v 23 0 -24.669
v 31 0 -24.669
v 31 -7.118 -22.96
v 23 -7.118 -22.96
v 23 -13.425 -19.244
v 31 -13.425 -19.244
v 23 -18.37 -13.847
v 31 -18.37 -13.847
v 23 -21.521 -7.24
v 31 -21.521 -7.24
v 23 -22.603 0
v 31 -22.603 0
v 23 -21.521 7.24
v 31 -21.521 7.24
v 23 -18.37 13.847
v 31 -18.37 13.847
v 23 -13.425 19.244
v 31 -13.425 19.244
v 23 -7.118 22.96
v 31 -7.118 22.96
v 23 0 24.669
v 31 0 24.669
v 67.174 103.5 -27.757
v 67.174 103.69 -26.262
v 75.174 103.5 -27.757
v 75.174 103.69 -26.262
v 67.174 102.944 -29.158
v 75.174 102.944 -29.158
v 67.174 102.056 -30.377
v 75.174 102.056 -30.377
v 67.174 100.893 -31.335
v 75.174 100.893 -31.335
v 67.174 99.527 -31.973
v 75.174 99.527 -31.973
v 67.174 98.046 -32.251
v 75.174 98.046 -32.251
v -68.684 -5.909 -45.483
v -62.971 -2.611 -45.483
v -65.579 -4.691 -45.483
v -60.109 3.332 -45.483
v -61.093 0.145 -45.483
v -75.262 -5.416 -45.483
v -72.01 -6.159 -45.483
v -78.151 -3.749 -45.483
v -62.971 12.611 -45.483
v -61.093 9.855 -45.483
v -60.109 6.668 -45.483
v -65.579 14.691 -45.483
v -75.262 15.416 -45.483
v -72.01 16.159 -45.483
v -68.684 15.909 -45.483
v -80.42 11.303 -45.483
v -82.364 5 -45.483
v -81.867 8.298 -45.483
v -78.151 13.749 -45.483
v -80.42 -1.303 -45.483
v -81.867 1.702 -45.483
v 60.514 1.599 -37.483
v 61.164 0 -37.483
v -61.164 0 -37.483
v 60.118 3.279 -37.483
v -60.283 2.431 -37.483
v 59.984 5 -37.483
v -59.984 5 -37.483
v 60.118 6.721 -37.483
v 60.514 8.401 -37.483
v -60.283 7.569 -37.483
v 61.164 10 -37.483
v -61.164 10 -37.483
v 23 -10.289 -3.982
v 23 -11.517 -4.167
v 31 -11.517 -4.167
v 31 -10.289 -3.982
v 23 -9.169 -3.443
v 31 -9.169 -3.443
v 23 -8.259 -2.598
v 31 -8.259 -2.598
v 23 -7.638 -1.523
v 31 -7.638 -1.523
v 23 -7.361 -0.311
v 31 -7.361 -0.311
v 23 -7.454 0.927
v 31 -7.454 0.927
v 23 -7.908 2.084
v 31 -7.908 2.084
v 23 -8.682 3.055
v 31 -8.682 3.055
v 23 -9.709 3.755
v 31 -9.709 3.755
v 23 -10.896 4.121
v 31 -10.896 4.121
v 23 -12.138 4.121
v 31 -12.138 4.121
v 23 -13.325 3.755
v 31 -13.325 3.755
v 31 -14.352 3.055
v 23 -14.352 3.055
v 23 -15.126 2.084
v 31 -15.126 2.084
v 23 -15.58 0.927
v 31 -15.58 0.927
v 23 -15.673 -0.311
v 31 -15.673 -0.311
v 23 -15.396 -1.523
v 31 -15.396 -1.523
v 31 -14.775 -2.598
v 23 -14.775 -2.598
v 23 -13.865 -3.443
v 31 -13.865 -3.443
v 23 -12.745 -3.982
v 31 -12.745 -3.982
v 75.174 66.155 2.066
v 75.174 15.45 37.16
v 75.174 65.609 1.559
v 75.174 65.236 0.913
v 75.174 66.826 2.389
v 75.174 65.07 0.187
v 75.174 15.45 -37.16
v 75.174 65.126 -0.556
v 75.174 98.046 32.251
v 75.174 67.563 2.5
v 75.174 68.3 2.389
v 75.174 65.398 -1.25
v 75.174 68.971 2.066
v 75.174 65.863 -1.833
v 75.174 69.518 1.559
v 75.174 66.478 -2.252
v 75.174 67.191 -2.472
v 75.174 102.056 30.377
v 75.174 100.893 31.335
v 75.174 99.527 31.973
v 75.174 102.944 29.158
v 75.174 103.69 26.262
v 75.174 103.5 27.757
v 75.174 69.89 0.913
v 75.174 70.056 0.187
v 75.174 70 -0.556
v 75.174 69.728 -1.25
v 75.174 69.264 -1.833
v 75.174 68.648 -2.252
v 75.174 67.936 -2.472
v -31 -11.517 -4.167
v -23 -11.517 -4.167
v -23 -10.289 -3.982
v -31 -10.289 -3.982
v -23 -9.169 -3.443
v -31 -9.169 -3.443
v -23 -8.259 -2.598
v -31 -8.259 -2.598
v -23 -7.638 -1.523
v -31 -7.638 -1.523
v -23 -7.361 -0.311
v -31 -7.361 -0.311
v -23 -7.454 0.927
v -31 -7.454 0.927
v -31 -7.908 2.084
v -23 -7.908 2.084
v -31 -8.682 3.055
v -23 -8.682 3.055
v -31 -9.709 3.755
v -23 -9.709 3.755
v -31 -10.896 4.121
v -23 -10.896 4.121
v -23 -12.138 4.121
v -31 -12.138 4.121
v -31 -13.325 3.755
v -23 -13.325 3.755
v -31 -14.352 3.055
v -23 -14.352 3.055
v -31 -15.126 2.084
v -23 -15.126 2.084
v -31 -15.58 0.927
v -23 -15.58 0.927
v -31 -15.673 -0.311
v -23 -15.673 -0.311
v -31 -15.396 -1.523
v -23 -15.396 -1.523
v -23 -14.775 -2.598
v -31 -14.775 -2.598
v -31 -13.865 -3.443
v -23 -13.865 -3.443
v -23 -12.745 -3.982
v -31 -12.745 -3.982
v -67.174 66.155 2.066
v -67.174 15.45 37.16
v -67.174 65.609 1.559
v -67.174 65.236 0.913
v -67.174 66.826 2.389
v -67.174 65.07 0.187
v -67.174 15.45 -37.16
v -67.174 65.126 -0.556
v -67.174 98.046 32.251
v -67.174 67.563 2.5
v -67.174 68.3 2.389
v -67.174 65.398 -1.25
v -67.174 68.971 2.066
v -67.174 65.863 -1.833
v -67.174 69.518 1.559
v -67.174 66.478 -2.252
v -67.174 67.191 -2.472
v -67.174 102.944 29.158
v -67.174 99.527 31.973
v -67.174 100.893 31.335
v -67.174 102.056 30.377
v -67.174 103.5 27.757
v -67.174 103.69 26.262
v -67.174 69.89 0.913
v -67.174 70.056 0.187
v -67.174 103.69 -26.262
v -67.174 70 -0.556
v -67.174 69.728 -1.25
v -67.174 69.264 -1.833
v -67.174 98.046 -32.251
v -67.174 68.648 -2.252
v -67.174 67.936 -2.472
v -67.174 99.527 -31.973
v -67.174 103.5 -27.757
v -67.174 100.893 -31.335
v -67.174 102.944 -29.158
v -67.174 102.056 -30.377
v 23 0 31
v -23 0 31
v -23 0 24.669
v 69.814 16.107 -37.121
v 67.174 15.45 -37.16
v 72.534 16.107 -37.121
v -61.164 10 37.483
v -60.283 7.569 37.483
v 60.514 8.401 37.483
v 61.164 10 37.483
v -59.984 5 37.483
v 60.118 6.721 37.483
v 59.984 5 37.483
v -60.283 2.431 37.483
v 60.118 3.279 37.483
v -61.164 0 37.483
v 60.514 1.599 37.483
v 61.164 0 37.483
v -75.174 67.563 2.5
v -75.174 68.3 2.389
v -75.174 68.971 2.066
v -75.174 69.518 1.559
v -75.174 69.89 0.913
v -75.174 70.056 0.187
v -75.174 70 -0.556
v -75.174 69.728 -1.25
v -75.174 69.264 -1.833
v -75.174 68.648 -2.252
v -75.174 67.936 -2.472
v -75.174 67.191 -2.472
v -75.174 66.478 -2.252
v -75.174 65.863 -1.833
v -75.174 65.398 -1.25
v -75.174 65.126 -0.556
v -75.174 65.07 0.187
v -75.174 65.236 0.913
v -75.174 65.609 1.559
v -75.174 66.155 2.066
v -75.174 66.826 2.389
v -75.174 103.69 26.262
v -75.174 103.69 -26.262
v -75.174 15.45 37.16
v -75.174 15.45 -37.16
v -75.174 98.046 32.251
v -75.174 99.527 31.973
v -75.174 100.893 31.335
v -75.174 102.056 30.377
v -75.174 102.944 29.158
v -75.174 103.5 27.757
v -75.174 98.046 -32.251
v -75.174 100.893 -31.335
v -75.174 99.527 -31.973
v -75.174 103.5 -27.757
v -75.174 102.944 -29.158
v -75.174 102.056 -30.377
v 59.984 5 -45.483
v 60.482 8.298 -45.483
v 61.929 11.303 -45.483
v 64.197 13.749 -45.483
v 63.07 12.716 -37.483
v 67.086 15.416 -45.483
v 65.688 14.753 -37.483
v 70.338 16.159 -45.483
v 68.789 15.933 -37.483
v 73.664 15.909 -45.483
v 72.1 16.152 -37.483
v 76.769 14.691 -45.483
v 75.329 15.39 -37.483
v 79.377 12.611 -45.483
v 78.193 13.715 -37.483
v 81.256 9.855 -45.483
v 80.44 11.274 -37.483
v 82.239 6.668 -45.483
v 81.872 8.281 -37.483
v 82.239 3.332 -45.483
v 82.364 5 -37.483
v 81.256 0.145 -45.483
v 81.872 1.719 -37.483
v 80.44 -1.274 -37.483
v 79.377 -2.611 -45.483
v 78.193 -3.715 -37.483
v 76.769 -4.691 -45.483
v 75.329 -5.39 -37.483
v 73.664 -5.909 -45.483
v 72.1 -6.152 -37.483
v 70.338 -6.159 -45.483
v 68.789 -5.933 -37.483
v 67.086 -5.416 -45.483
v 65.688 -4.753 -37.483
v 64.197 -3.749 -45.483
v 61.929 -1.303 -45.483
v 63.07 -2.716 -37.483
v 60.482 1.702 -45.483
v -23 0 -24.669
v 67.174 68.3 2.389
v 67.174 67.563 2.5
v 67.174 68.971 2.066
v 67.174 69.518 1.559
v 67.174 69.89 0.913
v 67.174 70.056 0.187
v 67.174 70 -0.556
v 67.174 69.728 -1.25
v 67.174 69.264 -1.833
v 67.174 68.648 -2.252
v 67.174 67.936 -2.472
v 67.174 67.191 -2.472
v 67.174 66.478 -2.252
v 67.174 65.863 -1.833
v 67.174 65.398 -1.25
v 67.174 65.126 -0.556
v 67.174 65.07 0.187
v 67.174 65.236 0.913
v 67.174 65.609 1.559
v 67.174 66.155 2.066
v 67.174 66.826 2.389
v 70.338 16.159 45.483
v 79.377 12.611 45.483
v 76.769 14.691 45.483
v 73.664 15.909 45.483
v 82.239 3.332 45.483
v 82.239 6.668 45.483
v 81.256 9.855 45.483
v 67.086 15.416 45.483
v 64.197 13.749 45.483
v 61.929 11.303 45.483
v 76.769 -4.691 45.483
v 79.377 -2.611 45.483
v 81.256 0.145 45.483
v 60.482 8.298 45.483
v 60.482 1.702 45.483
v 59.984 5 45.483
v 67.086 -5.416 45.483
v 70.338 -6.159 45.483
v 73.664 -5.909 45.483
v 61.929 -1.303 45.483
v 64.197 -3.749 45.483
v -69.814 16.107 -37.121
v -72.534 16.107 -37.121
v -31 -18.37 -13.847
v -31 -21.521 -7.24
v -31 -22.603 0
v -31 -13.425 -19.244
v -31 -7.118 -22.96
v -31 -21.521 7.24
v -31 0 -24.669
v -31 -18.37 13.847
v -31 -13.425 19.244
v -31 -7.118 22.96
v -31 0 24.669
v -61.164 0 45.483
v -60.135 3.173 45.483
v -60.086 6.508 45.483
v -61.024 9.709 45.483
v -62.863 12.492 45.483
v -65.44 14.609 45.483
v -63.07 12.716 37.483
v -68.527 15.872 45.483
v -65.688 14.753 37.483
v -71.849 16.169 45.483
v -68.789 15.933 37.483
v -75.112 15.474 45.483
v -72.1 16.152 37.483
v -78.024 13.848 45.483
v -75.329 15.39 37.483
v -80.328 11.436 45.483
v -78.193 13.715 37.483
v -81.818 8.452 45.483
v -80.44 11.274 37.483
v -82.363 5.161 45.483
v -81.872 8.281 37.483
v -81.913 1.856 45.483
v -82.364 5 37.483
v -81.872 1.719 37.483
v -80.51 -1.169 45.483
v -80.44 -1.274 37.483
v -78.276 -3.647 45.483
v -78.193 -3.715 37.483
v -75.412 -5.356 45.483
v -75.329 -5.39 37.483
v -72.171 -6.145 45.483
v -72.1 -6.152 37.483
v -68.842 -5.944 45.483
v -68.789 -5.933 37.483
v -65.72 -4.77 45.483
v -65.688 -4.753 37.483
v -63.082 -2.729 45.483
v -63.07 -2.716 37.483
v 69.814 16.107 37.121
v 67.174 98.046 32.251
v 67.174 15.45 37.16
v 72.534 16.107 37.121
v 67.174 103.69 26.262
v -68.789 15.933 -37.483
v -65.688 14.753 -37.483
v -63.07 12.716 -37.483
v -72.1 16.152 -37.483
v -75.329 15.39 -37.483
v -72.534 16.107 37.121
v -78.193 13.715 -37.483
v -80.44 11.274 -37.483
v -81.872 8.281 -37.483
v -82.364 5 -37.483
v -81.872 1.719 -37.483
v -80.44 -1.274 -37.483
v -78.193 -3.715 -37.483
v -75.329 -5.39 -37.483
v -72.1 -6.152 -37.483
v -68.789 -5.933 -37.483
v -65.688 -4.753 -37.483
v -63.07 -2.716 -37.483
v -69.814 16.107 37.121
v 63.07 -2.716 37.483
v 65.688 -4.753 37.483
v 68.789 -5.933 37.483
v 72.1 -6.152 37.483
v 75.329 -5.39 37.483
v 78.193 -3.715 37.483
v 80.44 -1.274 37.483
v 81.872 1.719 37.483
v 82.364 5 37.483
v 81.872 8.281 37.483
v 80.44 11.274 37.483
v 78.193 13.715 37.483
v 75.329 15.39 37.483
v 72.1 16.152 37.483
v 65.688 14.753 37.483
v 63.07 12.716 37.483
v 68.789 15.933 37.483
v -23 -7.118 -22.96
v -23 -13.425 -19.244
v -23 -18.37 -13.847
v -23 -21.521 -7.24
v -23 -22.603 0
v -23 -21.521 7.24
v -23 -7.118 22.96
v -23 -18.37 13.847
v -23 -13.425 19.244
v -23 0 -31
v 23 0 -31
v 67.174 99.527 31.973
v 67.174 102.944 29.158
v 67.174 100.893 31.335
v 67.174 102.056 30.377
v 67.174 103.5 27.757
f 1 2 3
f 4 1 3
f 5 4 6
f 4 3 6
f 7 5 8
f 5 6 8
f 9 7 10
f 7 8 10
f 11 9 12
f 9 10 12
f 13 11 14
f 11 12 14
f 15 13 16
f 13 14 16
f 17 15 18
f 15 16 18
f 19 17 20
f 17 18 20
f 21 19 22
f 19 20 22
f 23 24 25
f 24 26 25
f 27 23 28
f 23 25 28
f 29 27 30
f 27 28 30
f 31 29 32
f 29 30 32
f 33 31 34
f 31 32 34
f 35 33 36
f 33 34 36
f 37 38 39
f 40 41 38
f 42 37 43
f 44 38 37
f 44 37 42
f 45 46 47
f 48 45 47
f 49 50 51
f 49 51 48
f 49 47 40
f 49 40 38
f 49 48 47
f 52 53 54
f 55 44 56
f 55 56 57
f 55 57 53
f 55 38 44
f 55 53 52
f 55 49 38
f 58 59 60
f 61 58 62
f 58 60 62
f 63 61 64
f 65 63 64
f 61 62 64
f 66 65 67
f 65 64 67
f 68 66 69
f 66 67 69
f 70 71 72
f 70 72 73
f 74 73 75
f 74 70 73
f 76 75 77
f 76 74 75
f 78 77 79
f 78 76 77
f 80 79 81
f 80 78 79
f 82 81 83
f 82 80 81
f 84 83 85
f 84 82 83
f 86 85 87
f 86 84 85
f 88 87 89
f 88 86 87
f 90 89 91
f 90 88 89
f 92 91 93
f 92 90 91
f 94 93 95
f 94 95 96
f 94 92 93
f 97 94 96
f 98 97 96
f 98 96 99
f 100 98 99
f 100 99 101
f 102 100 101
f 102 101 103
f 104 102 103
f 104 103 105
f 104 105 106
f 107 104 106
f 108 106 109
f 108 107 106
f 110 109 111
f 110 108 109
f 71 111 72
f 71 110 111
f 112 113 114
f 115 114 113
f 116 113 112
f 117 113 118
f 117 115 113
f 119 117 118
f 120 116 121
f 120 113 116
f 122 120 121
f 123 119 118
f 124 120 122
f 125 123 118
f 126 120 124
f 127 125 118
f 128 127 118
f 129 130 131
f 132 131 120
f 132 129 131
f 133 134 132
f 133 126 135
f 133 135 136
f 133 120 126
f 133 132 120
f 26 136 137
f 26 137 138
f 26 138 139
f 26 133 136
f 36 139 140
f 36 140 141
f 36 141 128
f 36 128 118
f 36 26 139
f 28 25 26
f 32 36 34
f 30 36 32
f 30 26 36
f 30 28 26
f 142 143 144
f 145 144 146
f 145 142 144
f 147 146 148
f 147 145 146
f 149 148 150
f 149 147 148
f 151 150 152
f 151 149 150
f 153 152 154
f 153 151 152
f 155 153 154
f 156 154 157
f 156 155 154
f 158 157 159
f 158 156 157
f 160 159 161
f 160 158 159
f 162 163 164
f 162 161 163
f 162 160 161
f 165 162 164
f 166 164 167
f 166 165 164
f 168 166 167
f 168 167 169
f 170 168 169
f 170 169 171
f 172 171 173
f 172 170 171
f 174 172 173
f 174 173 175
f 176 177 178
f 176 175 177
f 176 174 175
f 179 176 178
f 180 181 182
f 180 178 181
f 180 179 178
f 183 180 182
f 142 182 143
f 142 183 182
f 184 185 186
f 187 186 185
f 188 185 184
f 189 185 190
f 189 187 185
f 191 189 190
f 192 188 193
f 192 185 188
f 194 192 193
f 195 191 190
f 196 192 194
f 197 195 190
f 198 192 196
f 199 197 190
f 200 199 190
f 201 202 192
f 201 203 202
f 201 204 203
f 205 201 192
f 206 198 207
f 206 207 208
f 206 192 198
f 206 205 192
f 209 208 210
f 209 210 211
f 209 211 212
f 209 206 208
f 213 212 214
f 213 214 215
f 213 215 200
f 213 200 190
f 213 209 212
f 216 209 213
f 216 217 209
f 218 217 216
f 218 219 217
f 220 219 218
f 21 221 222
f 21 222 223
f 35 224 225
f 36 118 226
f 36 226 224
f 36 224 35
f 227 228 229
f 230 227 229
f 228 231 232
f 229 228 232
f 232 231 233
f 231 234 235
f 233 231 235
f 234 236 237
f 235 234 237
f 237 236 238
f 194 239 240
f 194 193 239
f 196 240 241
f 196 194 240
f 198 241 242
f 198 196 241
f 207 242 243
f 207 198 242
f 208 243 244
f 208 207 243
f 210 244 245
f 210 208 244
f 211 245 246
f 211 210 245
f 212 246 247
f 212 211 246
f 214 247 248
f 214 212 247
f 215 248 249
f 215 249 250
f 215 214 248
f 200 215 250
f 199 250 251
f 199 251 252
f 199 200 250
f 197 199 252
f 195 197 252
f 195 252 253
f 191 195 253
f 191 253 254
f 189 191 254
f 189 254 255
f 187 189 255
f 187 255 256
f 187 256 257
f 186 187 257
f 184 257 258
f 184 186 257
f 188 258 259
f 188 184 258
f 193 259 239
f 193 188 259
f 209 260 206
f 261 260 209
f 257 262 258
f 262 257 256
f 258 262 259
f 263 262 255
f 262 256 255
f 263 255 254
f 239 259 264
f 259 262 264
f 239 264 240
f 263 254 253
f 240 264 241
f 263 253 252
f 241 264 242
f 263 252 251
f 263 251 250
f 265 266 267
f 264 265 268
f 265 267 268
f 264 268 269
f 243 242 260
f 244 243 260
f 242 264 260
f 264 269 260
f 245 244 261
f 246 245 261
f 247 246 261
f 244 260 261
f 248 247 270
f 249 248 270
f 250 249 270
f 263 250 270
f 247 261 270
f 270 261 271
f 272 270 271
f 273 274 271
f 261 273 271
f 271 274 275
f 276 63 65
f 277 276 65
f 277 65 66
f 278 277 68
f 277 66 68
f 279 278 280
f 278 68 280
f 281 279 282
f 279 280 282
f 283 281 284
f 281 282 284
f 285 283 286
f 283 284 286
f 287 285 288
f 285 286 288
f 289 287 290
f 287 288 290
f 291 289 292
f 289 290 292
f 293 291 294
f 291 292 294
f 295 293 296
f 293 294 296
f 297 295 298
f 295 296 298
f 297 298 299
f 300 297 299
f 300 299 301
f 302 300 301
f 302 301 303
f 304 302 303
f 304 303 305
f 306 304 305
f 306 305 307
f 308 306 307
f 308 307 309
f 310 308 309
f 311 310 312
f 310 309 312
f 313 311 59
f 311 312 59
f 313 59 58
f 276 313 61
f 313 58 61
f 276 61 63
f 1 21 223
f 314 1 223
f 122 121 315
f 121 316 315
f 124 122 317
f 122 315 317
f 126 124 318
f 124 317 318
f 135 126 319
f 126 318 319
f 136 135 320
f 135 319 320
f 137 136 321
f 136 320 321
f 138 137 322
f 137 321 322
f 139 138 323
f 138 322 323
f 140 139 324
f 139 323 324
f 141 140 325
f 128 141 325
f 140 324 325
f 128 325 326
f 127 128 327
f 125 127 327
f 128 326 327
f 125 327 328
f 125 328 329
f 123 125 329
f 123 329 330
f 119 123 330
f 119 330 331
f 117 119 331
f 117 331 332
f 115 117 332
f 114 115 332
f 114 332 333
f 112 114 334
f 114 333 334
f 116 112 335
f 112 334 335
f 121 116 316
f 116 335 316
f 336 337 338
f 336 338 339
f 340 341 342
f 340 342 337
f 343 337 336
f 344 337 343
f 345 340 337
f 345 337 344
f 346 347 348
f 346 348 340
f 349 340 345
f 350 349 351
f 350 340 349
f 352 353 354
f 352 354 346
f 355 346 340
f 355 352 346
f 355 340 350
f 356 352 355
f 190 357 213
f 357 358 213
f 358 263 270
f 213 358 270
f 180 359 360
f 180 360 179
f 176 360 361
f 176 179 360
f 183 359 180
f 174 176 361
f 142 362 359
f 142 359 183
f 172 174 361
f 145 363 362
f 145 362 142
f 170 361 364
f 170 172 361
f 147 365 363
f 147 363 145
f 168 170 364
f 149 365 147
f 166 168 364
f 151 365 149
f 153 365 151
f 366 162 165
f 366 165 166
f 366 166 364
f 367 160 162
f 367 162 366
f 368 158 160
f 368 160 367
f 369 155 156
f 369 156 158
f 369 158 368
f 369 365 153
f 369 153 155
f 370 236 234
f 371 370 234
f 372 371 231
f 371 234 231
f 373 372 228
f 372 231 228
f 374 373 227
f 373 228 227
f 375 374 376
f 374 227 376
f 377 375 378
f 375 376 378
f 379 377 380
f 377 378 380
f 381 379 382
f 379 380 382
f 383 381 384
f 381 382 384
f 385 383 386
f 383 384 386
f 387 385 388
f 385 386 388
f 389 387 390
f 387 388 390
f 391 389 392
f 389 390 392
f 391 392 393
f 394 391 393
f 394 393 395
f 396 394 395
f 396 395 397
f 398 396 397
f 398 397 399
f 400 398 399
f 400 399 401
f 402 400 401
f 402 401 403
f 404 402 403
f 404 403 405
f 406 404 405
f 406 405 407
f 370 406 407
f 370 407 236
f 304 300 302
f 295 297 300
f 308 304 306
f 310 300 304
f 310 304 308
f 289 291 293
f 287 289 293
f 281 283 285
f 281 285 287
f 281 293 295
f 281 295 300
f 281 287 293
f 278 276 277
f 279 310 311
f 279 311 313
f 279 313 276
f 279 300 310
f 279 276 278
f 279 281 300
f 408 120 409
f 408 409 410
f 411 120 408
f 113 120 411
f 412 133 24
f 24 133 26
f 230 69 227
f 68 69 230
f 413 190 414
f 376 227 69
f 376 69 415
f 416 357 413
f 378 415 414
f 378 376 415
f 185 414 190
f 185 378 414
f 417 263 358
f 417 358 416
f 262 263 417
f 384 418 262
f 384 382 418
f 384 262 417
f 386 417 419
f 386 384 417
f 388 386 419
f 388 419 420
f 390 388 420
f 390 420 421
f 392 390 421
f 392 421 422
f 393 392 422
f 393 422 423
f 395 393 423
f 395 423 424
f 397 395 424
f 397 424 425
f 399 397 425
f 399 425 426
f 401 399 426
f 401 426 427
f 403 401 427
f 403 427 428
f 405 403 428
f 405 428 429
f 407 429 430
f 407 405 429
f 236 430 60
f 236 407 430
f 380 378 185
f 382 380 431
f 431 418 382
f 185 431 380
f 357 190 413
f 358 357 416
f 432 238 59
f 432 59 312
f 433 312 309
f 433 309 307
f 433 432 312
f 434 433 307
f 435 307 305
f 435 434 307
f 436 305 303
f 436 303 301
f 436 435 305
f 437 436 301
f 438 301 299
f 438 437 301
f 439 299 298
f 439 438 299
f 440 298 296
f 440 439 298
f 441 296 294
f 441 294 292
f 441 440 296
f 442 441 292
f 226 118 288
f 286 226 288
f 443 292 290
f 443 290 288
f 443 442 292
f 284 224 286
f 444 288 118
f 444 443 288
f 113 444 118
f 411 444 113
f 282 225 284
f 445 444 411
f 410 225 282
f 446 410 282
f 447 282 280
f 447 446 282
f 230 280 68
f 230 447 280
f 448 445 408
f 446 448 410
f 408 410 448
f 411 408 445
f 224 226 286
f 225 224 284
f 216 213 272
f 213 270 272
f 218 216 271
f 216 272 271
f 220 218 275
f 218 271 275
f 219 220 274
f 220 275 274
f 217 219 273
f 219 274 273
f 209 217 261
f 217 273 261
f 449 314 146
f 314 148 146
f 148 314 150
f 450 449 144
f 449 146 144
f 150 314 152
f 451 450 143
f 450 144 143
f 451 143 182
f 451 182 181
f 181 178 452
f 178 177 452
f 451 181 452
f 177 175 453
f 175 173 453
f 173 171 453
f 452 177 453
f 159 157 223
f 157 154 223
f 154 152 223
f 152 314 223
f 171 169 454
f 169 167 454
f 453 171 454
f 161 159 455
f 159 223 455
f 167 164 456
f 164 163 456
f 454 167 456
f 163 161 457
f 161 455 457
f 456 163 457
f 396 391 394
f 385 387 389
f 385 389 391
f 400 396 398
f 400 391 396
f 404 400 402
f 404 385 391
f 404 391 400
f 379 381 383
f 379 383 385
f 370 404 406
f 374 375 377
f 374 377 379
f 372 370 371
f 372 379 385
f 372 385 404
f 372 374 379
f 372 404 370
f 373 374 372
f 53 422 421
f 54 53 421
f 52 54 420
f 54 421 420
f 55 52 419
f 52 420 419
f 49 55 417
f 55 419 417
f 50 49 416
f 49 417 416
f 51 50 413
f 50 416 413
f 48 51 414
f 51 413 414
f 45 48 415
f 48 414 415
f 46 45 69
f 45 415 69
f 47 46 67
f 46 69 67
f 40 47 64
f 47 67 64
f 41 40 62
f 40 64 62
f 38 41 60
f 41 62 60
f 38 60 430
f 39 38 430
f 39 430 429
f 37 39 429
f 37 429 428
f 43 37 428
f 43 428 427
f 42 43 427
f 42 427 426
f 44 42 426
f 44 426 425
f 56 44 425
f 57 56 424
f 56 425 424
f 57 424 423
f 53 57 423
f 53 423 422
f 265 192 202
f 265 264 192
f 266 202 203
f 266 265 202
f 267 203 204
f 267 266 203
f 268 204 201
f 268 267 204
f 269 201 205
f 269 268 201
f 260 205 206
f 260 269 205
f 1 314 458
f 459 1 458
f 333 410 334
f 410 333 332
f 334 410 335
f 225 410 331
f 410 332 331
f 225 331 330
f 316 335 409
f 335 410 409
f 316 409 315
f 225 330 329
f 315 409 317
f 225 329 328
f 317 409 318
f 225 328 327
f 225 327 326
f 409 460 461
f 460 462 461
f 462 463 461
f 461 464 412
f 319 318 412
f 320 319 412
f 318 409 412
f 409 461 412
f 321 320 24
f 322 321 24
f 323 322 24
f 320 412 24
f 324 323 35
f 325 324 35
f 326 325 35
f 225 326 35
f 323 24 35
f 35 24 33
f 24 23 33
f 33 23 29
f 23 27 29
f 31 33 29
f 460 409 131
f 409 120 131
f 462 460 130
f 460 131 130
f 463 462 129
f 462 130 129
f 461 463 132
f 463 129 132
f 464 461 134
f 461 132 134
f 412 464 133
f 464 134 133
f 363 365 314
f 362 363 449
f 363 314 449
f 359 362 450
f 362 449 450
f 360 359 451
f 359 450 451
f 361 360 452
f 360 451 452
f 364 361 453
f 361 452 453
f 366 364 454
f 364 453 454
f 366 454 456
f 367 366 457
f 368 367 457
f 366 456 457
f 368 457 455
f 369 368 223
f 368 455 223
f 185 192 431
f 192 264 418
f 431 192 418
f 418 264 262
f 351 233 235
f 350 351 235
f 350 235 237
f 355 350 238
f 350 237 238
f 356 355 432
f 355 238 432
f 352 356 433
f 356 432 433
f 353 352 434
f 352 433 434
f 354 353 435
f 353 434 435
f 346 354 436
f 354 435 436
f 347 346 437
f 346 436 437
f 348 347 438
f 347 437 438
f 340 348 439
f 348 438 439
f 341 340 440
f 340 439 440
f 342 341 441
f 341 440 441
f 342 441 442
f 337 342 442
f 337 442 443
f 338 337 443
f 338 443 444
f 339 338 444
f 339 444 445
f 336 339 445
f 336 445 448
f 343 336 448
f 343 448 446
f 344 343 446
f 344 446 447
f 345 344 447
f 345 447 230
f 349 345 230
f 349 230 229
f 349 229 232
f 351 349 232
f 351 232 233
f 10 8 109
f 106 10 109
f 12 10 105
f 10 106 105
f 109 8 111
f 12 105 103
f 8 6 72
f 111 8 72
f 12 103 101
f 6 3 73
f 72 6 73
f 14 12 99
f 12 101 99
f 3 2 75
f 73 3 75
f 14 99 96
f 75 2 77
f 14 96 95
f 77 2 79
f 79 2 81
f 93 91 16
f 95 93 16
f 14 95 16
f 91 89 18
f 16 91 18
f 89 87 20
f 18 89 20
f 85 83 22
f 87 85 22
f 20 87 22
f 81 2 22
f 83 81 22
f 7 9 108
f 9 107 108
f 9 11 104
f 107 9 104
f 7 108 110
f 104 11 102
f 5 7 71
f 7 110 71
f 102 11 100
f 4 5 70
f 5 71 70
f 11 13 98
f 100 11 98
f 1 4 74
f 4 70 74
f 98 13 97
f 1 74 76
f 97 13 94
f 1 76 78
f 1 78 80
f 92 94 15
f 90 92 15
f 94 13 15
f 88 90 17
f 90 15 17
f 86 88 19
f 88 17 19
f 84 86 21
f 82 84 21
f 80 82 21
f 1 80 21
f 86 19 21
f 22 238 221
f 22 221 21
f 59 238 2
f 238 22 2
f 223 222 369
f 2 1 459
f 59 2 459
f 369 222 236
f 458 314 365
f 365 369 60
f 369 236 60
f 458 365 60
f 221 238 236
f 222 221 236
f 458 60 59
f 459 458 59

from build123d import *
from build123d.topology import SkipClean

# Parameters (mm, degrees)
SKETCH2_W           = 142.348460158
SKETCH2_H           = 74.966845352
BOSS_EXTRUDE1_DEPTH = 10
SKETCH3_2_R         = 11.189856227
BOSS_EXTRUDE3_DEPTH = 8
SKETCH6_R           = 2.5
BOSS_EXTRUDE5_DEPTH = 4
SKETCH3_R           = 11.189856227
BOSS_EXTRUDE2_DEPTH = 74.966845352
SKETCH4_R           = 11.189856227
BOSS_EXTRUDE4_DEPTH = 8
FILLET1_R           = 6
SKETCH8_R           = 4.167459473
BOSS_EXTRUDE6_DEPTH = 31
CUT_EXTRUDE1_DEPTH  = 31


with BuildPart() as part:
    # Sketch2 → Boss-Extrude1 (new body)
    with BuildSketch(Plane(origin=(0, 0, 0), x_dir=(1, 0, 0), z_dir=(0, 1, 0))):
        Rectangle(SKETCH2_W, SKETCH2_H)
    extrude(amount=BOSS_EXTRUDE1_DEPTH)

    # Sketch3<2> → Boss-Extrude3 (add)
    with BuildSketch(Plane.XY.offset(37.483422676)):
        with Locations(Location((-71.174230079, 5, 0), (0, 0, 333.459309643))):
            Circle(SKETCH3_2_R)
        with Locations(Location((71.174230079, 5, 0), (0, 0, 180))):
            Circle(SKETCH3_2_R)
    extrude(amount=BOSS_EXTRUDE3_DEPTH)

    # Sketch6 → Boss-Extrude5 (add, symmetric)
    with BuildSketch(Plane.ZY.offset(71.174230079)):
        Polygon((31.91575234, 103.68960792), (37.483422676, 10), (37.483422676, 0), (-37.483422676, 0), (-37.483422676, 10), (-31.91575234, 103.68960792), (0, 103.68960792), align=None)
        with Locations((0, 67.56317466)):
            Circle(SKETCH6_R, mode=Mode.SUBTRACT)
    boss_extrude5 = extrude(amount=BOSS_EXTRUDE5_DEPTH, both=True)

    # Sketch3 → Boss-Extrude2 (add)
    with BuildSketch(Plane.XY.offset(37.483422676)):
        with Locations(Location((-71.174230079, 5, 0), (0, 0, 333.459309643))):
            Circle(SKETCH3_R)
        with Locations(Location((71.174230079, 5, 0), (0, 0, 180))):
            Circle(SKETCH3_R)
    extrude(amount=-BOSS_EXTRUDE2_DEPTH)

    # Sketch4 → Boss-Extrude4 (add)
    with SkipClean():  # the faces are left unmerged after this step: merging them gives an invalid solid
        with BuildSketch(Plane(origin=(0, 0, -37.483422676), x_dir=(-1, 0, 0), z_dir=(0, 0, -1))):
            with Locations((-71.174230079, 5)):
                Circle(SKETCH4_R)
            with Locations((71.174230079, 5)):
                Circle(SKETCH4_R)
        extrude(amount=BOSS_EXTRUDE4_DEPTH)

    # Mirror1: Boss-Extrude5 across plane
    add(boss_extrude5.mirror(Plane(origin=(0, 0, 0), x_dir=(0, 0, 1), z_dir=(1, 0, 0))))

    # Fillet1
    fillet1_edges = [part.edges().sort_by_distance(p)[0] for p in [
        (71.174230079, 103.68960792, -31.91575234),
        (-71.174230079, 103.68960792, 31.91575234),
        (-71.174230079, 103.68960792, -31.91575234),
        (71.174230079, 103.68960792, 31.91575234),
    ]]
    fillet(fillet1_edges, radius=FILLET1_R)

    # Sketch8 → Boss-Extrude6 (add, symmetric)
    with BuildSketch(Plane(origin=(0, 0, 0), x_dir=(0, 0, -1), z_dir=(1, 0, 0))):
        with BuildLine():
            Line((-24.669316097, 0), (0, 0))
            Line((0, 0), (24.669316097, 0))
            ThreePointArc((24.669316097, 0), (0, -22.602874457), (-24.669316097, 0))
        make_face()
        with Locations((0, -11.517091371)):
            Circle(SKETCH8_R, mode=Mode.SUBTRACT)
    extrude(amount=BOSS_EXTRUDE6_DEPTH, both=True)

    # Sketch9 → Cut-Extrude1 (cut, symmetric)
    with BuildSketch(Plane.XY):
        Polygon((0, 0), (-23, 0), (-23, -24.601759038), (-2.110664843, -24.601759038), (23, -24.601759038), (23, 0), align=None)
    extrude(amount=CUT_EXTRUDE1_DEPTH, both=True, mode=Mode.SUBTRACT)


solid = part.part
